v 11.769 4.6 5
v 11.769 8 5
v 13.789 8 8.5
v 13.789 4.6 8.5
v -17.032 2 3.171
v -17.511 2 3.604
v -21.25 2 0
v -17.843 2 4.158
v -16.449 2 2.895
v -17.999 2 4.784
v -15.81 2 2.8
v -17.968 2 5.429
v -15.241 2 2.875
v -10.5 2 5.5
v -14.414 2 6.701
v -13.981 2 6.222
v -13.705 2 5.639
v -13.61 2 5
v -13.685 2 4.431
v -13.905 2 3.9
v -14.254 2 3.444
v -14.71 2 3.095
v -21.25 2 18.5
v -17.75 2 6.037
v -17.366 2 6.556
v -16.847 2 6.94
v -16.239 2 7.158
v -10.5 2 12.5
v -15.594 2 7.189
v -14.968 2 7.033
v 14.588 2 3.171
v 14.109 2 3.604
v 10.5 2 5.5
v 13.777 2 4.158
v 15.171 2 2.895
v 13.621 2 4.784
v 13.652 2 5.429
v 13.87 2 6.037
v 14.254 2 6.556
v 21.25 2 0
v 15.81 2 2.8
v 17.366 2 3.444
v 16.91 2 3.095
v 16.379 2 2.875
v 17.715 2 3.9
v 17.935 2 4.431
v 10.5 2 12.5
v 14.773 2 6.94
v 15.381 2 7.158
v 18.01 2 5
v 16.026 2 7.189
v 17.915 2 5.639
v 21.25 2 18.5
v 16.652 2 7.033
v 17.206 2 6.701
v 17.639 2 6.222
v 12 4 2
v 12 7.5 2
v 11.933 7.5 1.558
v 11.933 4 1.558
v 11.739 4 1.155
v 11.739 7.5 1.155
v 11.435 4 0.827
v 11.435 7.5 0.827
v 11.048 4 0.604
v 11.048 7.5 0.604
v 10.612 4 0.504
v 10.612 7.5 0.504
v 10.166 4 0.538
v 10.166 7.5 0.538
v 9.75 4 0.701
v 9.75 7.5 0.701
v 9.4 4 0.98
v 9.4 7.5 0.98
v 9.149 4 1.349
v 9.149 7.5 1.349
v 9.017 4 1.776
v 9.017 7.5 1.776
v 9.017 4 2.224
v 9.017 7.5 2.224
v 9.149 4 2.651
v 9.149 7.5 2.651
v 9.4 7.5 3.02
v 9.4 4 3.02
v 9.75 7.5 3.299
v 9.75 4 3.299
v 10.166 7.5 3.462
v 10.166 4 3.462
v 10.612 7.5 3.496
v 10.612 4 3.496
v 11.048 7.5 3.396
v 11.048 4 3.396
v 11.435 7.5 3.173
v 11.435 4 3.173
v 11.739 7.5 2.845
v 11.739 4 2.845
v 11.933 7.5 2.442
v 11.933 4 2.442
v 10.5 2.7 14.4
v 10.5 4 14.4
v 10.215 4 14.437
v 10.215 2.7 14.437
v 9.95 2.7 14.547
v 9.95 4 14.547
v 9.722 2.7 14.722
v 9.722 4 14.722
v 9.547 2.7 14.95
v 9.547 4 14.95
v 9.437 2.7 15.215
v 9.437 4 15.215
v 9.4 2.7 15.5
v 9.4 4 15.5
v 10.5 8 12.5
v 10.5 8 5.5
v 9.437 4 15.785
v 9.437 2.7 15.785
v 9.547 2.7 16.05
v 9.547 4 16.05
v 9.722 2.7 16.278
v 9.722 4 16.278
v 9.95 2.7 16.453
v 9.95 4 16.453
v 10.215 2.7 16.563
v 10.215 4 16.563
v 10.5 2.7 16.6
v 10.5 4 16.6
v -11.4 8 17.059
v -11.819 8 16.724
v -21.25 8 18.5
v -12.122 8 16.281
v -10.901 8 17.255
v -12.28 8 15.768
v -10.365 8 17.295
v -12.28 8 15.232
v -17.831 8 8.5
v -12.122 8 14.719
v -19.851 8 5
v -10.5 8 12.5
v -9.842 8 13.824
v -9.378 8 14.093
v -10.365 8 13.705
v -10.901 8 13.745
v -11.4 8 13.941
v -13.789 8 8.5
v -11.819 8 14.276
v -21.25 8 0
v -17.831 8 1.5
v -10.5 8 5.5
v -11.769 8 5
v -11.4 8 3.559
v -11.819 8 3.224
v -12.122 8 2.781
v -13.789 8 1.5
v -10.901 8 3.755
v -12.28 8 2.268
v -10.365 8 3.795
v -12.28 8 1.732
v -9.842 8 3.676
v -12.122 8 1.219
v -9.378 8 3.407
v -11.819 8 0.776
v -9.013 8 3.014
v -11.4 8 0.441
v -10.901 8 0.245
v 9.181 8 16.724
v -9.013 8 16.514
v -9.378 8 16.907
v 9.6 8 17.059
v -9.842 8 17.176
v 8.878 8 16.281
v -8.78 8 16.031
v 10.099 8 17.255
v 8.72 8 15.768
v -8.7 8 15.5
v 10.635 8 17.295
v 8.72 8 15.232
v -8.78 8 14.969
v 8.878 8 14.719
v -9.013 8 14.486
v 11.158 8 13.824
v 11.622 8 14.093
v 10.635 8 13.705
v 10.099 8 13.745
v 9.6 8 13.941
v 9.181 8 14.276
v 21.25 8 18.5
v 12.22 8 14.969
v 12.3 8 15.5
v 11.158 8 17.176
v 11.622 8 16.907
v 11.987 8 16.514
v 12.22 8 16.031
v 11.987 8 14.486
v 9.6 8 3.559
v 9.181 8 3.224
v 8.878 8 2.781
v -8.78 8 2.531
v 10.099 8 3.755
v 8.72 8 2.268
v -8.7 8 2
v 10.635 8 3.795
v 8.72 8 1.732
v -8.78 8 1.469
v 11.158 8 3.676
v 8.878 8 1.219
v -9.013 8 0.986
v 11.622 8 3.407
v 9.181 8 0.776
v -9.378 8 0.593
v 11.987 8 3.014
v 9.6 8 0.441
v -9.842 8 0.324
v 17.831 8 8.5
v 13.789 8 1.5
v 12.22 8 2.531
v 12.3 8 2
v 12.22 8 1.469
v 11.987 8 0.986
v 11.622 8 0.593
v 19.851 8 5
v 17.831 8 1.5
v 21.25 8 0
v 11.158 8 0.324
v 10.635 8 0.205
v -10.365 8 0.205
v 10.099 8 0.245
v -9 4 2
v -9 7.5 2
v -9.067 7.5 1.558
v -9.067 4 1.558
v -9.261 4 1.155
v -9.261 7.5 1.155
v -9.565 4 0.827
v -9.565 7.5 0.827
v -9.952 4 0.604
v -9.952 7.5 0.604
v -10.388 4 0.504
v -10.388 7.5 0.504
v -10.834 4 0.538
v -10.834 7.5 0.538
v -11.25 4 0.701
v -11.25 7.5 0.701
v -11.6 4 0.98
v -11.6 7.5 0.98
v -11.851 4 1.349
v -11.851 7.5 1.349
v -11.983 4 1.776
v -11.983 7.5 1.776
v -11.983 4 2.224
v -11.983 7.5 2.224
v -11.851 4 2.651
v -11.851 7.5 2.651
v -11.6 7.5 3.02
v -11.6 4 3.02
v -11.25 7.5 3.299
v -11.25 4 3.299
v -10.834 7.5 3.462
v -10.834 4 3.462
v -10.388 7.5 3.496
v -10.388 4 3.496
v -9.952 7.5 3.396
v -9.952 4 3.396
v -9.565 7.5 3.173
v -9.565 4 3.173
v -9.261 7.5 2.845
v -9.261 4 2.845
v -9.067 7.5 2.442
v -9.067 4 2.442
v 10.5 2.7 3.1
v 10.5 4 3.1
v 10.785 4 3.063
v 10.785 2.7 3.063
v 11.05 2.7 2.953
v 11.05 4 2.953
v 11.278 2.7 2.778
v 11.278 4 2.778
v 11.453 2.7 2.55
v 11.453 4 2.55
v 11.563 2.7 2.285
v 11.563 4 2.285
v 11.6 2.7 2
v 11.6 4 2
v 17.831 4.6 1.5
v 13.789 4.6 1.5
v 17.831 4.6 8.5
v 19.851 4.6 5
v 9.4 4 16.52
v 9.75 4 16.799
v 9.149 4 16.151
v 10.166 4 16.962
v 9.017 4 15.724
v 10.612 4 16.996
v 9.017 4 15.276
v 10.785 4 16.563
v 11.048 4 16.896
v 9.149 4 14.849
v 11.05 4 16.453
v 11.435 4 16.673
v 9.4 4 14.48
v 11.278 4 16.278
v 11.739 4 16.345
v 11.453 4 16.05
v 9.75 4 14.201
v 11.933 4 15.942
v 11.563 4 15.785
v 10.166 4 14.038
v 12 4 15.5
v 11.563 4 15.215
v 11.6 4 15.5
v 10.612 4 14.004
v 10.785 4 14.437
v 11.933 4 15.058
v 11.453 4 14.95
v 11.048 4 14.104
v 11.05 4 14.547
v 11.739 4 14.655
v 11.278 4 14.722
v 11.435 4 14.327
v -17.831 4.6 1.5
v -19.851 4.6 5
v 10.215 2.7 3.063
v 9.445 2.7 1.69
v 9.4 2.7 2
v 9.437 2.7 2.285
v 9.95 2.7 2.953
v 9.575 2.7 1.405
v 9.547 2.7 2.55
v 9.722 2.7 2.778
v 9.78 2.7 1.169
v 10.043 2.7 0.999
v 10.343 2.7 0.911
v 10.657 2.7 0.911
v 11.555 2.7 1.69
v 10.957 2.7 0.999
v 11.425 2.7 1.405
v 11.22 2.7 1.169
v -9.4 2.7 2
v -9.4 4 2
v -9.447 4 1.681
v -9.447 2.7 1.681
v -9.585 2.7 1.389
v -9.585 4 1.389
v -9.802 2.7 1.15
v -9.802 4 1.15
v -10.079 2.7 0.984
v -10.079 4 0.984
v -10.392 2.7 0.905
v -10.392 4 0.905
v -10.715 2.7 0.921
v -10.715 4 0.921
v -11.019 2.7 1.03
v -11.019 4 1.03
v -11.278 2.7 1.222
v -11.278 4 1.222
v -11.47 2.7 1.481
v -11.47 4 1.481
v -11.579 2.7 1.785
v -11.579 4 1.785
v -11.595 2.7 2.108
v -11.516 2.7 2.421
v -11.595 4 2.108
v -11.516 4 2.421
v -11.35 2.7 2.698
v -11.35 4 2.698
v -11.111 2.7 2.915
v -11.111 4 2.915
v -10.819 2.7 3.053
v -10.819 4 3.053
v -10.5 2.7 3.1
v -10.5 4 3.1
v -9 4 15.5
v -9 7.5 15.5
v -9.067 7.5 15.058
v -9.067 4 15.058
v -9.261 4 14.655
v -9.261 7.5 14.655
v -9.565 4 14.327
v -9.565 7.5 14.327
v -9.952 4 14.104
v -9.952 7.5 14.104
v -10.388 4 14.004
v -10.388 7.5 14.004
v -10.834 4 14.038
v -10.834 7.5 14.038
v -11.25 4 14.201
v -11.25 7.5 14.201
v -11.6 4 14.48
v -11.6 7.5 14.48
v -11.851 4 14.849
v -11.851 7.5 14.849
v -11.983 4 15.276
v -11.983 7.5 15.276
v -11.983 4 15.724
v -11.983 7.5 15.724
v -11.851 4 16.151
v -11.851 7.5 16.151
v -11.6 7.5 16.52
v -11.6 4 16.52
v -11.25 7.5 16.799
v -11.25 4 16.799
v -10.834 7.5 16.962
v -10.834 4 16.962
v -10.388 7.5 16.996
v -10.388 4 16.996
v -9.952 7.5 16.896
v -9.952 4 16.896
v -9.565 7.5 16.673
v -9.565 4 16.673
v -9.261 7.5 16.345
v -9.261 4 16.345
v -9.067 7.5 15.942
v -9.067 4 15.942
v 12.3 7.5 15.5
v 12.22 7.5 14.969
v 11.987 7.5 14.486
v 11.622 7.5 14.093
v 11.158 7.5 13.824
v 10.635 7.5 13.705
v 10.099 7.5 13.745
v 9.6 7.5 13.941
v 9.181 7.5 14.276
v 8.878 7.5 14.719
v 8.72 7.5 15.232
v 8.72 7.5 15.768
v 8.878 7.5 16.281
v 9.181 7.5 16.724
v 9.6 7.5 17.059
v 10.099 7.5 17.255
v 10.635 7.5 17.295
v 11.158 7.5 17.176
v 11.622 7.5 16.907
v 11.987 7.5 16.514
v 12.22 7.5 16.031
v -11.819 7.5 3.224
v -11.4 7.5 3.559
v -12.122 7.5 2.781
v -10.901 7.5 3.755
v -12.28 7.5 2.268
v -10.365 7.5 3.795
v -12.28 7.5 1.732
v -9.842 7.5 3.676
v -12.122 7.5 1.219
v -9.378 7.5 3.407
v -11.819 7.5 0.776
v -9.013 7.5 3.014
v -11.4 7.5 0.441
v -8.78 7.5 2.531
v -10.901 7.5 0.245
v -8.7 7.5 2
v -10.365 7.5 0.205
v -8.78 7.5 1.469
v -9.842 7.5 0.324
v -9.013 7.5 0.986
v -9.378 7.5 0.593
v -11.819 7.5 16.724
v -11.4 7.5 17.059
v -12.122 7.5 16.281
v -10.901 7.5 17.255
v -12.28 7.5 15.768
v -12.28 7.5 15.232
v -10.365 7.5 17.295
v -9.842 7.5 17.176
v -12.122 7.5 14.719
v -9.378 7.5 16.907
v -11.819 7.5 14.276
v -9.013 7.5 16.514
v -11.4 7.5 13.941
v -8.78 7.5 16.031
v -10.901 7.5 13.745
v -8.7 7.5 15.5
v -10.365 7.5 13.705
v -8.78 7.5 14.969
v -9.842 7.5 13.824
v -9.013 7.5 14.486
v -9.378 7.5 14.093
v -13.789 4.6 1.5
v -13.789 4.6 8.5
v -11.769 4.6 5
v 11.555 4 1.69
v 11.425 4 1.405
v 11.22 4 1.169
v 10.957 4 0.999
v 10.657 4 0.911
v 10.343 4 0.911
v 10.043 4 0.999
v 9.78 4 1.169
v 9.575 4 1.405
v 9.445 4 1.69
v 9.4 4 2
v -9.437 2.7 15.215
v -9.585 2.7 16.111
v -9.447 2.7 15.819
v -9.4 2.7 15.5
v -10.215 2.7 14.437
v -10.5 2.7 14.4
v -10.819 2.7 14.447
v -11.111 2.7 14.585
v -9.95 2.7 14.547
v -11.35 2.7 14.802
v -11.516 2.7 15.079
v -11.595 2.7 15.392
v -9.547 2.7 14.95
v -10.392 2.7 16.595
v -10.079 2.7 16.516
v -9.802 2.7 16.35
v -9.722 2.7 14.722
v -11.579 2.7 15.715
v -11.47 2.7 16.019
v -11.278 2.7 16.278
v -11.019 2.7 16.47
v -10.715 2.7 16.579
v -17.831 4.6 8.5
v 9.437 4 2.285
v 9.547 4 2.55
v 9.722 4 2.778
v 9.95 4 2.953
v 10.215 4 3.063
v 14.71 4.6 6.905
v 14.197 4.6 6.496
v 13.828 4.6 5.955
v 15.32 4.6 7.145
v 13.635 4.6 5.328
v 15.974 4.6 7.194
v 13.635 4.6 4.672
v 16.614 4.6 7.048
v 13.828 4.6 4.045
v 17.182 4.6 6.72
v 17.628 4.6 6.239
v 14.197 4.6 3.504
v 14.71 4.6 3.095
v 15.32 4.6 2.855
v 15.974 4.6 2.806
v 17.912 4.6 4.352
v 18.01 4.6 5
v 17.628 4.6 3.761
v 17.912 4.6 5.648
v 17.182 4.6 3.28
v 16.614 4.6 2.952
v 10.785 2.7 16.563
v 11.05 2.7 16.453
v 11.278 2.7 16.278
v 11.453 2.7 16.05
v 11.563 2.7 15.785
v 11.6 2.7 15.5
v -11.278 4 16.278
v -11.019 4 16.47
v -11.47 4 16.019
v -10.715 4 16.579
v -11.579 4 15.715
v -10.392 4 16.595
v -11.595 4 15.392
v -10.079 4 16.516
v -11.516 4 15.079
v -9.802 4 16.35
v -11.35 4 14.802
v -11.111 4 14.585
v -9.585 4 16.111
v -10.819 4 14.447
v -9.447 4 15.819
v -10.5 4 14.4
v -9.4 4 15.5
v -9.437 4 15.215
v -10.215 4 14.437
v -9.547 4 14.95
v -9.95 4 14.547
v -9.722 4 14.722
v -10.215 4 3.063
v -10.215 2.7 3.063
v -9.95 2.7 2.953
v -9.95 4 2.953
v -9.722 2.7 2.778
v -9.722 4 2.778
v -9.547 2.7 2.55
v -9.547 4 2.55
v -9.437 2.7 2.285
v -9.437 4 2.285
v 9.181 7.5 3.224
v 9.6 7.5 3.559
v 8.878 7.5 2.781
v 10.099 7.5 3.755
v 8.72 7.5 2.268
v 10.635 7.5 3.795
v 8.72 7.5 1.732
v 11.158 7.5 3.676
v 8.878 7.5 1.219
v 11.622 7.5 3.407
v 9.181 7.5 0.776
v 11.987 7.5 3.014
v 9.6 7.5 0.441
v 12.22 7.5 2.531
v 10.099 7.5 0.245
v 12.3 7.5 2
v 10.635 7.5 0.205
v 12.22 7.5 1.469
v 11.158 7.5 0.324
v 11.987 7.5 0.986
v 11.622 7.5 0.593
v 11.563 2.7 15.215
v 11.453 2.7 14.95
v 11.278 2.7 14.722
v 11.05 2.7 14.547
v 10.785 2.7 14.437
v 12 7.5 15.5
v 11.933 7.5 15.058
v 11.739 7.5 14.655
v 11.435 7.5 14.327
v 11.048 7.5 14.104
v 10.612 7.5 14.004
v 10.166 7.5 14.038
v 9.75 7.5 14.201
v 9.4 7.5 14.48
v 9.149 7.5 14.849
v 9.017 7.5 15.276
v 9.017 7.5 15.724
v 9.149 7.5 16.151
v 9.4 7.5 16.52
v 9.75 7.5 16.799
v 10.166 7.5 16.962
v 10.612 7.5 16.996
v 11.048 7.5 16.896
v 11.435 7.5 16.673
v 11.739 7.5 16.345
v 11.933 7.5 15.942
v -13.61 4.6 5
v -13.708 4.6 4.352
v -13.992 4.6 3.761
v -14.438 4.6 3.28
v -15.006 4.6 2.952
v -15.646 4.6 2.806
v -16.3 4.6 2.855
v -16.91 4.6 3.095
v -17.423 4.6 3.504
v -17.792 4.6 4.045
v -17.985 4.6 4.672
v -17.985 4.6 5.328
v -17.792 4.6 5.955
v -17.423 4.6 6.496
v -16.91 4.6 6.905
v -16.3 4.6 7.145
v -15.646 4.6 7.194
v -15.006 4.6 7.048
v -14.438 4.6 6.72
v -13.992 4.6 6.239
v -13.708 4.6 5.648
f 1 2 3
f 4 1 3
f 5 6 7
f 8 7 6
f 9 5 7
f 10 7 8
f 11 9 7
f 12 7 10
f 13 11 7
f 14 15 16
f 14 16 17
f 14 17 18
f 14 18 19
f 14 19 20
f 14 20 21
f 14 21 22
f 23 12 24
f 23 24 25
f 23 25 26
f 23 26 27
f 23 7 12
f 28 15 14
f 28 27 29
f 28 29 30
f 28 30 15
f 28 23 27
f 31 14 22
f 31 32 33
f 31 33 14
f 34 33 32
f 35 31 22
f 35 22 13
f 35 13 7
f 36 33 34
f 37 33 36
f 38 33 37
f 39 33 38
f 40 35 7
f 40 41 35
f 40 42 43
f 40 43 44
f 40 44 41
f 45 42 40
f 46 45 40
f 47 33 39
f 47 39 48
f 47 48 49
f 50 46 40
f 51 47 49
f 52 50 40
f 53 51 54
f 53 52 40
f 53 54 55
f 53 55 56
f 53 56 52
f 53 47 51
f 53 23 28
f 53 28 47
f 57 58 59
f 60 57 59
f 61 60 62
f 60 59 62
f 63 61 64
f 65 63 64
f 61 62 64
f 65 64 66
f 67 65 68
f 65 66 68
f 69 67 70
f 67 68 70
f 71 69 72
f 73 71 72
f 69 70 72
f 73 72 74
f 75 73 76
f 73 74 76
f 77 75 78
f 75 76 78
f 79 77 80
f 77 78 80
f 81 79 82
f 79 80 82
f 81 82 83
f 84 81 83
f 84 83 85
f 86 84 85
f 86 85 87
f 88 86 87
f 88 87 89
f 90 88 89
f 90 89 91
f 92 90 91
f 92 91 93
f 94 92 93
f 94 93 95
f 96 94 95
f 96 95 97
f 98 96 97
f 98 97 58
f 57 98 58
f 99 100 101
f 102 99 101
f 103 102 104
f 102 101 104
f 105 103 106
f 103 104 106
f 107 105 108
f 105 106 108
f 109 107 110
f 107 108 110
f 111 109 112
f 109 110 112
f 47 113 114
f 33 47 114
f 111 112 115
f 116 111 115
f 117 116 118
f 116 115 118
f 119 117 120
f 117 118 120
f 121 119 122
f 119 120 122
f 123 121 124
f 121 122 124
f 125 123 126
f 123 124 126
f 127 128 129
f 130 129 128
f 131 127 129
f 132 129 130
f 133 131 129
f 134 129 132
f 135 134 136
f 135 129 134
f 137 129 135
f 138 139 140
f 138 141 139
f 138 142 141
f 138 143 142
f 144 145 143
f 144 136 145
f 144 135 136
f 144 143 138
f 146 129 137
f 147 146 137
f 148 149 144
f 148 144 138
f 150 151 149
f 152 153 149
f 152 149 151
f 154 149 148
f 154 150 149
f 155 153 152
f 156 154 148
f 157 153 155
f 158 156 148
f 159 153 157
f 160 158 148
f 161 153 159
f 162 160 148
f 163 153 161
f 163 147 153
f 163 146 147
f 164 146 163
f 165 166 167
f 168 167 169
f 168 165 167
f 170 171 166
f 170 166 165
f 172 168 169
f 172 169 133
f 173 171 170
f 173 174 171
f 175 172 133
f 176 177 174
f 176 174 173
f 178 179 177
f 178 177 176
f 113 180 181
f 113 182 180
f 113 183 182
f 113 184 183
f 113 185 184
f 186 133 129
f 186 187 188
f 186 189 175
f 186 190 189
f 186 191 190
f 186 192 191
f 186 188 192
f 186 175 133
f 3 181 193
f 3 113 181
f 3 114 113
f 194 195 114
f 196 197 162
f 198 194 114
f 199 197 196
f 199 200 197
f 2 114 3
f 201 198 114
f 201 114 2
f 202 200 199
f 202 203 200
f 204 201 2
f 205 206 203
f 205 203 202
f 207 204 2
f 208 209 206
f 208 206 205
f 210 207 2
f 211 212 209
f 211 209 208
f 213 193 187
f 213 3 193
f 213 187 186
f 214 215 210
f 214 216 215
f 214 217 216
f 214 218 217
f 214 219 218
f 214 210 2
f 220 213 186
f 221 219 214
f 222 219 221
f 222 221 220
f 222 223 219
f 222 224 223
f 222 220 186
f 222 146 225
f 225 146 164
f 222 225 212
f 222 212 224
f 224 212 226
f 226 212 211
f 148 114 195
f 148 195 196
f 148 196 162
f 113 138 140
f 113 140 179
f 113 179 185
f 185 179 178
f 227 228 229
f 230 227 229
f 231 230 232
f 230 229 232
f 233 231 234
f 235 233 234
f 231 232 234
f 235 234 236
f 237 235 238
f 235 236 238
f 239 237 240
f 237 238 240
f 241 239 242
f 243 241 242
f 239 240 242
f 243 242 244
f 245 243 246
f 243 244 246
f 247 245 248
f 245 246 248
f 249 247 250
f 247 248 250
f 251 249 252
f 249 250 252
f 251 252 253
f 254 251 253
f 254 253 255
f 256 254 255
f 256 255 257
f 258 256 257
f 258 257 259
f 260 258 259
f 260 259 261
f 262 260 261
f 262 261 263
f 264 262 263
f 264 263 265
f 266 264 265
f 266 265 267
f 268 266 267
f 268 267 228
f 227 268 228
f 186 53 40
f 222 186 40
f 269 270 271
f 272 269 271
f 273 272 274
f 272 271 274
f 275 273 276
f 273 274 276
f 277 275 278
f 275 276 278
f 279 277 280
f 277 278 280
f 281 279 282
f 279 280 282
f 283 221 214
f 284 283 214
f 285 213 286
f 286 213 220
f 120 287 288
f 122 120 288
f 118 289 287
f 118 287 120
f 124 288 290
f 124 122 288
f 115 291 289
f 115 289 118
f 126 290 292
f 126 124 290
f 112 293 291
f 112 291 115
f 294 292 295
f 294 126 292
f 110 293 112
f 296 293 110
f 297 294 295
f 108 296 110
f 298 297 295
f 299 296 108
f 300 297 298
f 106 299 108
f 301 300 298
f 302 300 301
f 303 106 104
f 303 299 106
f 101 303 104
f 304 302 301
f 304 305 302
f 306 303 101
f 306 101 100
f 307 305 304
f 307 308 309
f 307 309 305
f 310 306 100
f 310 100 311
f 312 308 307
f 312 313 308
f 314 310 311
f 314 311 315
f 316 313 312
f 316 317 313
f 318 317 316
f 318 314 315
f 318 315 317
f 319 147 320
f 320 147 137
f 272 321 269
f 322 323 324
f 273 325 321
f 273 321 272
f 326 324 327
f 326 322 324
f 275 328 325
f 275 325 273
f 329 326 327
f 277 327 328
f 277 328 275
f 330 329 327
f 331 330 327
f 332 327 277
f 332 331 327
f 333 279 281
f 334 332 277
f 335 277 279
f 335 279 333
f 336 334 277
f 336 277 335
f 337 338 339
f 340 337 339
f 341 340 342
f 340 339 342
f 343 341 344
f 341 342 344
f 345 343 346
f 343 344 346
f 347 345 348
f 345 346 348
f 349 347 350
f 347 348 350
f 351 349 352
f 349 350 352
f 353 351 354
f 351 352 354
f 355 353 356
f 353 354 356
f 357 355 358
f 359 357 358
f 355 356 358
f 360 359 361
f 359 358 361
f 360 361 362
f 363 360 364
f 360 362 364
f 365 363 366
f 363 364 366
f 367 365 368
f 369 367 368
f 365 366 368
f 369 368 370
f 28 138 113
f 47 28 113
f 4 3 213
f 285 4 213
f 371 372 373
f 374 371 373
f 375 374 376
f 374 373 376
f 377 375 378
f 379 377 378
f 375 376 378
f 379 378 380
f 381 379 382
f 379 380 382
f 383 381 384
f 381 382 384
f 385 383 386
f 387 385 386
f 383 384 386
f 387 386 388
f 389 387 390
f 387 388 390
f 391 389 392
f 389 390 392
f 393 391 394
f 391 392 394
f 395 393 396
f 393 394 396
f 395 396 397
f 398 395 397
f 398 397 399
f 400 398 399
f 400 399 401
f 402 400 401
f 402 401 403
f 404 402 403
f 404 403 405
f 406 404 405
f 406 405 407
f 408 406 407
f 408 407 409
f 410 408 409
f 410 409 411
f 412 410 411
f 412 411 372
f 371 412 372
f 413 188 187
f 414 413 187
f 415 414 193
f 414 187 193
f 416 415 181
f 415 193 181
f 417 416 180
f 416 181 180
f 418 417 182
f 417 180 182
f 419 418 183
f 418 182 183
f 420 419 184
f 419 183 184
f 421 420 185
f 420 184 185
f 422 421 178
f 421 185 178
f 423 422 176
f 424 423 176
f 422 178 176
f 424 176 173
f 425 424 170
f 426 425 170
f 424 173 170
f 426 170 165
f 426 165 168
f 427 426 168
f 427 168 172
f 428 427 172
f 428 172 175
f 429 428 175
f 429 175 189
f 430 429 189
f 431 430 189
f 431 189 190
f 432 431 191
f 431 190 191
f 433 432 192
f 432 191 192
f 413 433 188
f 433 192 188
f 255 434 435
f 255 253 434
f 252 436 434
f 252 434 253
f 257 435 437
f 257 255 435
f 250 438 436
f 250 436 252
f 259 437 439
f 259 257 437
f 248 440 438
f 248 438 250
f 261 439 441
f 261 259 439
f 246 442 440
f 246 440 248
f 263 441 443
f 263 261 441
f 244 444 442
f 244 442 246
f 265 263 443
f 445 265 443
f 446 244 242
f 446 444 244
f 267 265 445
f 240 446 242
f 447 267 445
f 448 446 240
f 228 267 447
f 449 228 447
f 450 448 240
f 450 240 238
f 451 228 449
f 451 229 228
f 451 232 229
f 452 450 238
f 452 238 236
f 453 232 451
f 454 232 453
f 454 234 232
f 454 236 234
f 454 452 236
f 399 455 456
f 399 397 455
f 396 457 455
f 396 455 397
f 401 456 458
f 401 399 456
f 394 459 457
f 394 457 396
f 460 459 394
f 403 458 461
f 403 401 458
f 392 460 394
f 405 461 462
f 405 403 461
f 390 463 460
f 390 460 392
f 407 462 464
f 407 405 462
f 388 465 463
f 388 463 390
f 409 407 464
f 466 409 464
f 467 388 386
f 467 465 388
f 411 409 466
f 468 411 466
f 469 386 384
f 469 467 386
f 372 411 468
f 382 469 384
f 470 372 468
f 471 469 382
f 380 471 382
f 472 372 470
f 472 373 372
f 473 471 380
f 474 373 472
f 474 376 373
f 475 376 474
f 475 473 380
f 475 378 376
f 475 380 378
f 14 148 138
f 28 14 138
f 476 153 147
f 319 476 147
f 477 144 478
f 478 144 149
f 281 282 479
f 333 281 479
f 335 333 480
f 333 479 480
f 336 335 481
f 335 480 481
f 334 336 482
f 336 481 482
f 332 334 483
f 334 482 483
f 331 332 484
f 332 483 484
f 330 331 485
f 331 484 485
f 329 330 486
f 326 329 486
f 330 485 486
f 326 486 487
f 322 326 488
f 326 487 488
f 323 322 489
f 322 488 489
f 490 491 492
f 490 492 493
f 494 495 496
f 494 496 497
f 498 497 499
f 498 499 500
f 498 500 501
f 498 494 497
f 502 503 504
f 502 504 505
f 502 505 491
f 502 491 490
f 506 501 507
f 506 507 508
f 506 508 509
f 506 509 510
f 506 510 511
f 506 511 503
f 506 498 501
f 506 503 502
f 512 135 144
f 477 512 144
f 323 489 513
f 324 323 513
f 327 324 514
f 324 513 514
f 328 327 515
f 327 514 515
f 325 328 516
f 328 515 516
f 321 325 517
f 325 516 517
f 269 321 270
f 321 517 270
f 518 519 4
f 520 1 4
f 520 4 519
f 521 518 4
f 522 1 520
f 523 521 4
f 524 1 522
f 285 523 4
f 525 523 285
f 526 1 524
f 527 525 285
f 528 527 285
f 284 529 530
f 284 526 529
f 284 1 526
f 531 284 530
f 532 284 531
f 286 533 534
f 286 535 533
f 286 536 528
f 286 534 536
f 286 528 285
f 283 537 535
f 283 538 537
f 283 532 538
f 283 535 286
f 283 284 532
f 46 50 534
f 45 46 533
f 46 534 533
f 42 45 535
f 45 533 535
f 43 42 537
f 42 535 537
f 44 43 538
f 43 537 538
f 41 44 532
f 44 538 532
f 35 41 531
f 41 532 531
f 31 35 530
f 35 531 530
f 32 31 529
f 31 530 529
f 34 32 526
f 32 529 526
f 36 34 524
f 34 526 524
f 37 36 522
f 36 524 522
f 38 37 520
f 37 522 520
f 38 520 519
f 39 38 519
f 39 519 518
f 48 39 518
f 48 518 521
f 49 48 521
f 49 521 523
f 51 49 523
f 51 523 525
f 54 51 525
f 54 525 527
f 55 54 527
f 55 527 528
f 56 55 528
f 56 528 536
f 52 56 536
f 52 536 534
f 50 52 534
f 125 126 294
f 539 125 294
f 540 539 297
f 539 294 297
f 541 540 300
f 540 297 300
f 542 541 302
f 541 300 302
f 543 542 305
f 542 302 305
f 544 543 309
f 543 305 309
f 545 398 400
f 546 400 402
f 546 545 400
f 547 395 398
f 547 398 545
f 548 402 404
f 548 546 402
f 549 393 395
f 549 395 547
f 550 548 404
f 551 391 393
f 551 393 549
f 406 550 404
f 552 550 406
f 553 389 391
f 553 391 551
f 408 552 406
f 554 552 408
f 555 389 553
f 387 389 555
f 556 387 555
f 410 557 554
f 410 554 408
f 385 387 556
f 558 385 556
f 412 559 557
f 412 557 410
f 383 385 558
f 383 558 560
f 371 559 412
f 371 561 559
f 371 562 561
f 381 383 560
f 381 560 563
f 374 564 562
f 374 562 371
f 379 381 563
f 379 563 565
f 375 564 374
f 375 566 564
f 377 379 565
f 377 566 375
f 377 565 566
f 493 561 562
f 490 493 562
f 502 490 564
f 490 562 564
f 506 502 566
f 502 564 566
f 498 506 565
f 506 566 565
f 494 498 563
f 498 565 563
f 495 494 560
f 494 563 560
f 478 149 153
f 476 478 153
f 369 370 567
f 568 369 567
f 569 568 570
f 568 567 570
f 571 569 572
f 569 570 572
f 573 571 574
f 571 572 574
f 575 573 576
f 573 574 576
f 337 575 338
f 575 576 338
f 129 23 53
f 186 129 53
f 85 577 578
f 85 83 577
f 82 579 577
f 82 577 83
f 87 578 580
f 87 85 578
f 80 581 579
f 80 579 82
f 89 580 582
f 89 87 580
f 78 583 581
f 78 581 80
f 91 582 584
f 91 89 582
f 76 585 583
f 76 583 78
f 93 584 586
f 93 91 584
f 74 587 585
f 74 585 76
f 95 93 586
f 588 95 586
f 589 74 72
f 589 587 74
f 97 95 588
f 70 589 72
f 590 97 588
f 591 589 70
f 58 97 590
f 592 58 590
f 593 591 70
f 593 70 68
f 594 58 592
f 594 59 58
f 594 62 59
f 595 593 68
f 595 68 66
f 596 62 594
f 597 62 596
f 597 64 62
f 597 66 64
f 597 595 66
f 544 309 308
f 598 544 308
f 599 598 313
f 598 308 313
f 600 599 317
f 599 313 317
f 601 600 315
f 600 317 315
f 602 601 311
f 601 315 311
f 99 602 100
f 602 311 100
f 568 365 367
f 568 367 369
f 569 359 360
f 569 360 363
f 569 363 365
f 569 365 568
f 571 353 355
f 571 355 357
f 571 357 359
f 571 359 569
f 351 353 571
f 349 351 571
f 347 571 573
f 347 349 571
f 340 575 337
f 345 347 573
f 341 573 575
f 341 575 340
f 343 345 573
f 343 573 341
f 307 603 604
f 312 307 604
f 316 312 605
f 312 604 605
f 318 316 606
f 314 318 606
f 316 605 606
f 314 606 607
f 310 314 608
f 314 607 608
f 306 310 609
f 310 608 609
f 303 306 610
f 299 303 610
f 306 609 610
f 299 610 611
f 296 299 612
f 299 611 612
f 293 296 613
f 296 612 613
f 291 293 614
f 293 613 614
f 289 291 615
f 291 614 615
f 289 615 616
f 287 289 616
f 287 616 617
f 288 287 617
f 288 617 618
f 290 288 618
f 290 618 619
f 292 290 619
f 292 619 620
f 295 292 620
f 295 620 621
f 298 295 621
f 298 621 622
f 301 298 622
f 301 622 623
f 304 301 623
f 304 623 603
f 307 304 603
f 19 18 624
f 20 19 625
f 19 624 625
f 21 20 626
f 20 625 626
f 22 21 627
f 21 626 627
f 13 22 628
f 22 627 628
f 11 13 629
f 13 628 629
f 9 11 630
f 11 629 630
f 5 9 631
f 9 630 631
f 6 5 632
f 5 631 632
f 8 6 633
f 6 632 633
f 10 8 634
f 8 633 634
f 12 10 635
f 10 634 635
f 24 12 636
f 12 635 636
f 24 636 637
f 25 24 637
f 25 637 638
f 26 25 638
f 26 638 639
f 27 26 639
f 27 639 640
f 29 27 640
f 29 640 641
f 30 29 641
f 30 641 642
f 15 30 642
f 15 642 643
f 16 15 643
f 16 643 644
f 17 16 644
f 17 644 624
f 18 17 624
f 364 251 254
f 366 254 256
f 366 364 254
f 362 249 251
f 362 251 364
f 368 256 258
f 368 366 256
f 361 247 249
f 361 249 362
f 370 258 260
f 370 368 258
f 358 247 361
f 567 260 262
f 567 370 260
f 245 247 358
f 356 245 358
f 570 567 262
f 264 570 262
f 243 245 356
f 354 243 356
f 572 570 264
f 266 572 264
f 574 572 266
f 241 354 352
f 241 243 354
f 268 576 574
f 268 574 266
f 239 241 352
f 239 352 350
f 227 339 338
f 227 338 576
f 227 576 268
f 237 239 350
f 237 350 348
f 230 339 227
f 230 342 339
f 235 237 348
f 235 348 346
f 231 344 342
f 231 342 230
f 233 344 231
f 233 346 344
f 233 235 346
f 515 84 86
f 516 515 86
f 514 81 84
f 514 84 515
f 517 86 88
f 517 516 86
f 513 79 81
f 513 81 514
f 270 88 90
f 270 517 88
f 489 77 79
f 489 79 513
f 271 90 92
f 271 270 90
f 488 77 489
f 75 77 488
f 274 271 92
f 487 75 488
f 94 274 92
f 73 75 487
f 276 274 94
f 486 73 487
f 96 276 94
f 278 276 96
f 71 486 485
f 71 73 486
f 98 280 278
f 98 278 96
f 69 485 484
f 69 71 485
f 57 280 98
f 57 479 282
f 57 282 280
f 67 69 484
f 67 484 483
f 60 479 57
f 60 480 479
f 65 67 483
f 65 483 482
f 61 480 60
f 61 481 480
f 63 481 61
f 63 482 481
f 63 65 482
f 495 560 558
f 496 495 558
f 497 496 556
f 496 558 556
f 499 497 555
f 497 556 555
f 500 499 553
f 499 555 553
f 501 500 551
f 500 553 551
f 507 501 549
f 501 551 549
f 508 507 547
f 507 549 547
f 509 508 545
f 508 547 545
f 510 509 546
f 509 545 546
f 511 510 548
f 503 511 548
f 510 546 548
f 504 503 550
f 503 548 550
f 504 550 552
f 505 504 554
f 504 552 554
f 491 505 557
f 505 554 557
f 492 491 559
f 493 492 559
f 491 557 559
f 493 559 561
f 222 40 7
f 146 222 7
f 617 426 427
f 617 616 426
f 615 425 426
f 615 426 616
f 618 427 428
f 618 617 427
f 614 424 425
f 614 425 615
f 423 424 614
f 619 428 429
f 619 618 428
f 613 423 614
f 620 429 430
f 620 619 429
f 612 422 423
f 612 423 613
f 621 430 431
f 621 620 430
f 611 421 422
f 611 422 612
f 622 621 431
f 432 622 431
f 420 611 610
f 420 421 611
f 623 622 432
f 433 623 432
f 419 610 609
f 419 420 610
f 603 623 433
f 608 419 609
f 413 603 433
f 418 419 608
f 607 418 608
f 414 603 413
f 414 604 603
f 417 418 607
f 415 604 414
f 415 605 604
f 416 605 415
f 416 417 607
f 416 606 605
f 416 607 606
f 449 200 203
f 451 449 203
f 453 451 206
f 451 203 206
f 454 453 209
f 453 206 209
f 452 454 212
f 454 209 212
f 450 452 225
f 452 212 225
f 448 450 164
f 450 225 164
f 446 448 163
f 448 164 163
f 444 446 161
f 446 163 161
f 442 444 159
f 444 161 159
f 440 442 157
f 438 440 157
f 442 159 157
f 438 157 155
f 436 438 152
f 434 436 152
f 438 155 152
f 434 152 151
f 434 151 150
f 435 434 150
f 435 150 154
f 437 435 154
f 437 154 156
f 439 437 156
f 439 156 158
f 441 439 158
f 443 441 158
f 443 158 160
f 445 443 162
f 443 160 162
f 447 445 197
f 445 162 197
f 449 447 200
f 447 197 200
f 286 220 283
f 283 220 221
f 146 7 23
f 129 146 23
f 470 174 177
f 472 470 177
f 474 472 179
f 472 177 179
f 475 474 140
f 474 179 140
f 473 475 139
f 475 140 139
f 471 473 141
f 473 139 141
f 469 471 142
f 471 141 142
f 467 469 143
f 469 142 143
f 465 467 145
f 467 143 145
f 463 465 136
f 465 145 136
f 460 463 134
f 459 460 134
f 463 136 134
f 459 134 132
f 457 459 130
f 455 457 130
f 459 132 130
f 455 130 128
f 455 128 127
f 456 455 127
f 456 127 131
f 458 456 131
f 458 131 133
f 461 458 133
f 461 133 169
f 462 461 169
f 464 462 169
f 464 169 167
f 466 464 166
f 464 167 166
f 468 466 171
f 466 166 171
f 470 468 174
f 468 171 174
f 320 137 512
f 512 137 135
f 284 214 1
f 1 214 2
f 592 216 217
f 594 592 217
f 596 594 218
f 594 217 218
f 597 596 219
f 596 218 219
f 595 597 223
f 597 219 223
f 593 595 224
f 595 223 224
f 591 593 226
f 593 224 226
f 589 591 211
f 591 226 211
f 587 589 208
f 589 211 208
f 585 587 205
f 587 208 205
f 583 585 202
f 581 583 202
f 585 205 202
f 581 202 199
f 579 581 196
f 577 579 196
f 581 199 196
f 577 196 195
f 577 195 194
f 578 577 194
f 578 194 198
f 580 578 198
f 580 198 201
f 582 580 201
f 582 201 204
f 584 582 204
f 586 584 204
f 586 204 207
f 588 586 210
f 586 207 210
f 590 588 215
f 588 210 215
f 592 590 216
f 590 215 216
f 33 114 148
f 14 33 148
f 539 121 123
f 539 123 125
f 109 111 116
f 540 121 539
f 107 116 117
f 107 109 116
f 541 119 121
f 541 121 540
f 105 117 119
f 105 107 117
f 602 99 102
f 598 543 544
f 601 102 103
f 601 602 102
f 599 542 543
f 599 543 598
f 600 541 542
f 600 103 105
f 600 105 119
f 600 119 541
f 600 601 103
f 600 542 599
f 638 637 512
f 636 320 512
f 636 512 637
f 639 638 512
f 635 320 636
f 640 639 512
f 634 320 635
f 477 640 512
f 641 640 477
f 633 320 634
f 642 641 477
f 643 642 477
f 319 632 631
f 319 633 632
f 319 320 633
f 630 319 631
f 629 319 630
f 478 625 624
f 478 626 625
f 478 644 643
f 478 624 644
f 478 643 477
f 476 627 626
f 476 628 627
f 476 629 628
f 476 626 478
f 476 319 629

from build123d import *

# Parameters (mm, degrees)
BOSS_EXTRUDE1_DEPTH = 8
SKETCH2_R           = 2.2
CUT_EXTRUDE1_DEPTH  = 20
CUT_EXTRUDE2_DEPTH  = 5.3
SKETCH4_R           = 1.5
CUT_EXTRUDE3_DEPTH  = 4
SKETCH5_R           = 1.8
CUT_EXTRUDE4_DEPTH  = 0.5
CUT_EXTRUDE5_DEPTH  = 3.4
CUT_EXTRUDE6_DEPTH  = 18.4
SKETCH9_W           = 21
SKETCH9_H           = 3
CUT_EXTRUDE8_DEPTH  = 2


with BuildPart() as part:
    # Sketch1 → Boss-Extrude1 (new body)
    with BuildSketch(Plane(origin=(0, 0, 0), x_dir=(1, 0, 0), z_dir=(0, 1, 0))):
        Polygon((-21.25, -18.5), (21.25, -18.5), (21.25, 0), (15.81, 0), (-15.81, 0), (-21.25, 0), align=None)
    extrude(amount=BOSS_EXTRUDE1_DEPTH)

    # Sketch2 → Cut-Extrude1 (cut)
    with BuildSketch(Plane(origin=(0, 8, 0), x_dir=(1, 0, 0), z_dir=(0, 1, 0))):
        with Locations((-15.81, -5)):
            Circle(SKETCH2_R)
        with Locations((15.81, -5)):
            Circle(SKETCH2_R)
    extrude(amount=-CUT_EXTRUDE1_DEPTH, mode=Mode.SUBTRACT)

    # Sketch3 → Cut-Extrude2 (cut)
    with BuildSketch(Plane(origin=(0, 8, 0), x_dir=(1, 0, 0), z_dir=(0, 1, 0))):
        with BuildLine():
            ThreePointArc((-10.5, -14.4), (-11.277817459, -16.277817459), (-9.4, -15.5))
            Line((-9.4, -15.5), (-10.5, -15.5))
            Line((-10.5, -15.5), (-10.5, -14.4))
        make_face()
        with BuildLine():
            Line((-10.5, -15.5), (-9.4, -15.5))
            ThreePointArc((-9.4, -15.5), (-9.722182541, -14.722182541), (-10.5, -14.4))
            Line((-10.5, -14.4), (-10.5, -15.5))
        make_face()
        with BuildLine():
            ThreePointArc((-9.4, -2), (-11.277817459, -1.222182541), (-10.5, -3.1))
            Line((-10.5, -3.1), (-10.5, -2))
            Line((-10.5, -2), (-9.4, -2))
        make_face()
        with BuildLine():
            Line((-10.5, -2), (-10.5, -3.1))
            ThreePointArc((-10.5, -3.1), (-9.722182541, -2.777817459), (-9.4, -2))
            Line((-9.4, -2), (-10.5, -2))
        make_face()
        with BuildLine():
            ThreePointArc((9.4, -2), (9.722182541, -2.777817459), (10.5, -3.1))
            Line((10.5, -3.1), (10.5, -2))
            Line((10.5, -2), (9.4, -2))
        make_face()
        with BuildLine():
            Line((10.5, -2), (10.5, -3.1))
            ThreePointArc((10.5, -3.1), (11.277817459, -2.777817459), (11.6, -2))
            ThreePointArc((11.6, -2), (10.5, -0.9), (9.4, -2))
            Line((9.4, -2), (10.5, -2))
        make_face()
        with BuildLine():
            Line((10.5, -16.6), (10.5, -15.5))
            Line((10.5, -15.5), (9.4, -15.5))
            ThreePointArc((9.4, -15.5), (9.722182541, -16.277817459), (10.5, -16.6))
        make_face()
        with BuildLine():
            Line((10.5, -14.4), (10.5, -15.5))
            Line((10.5, -15.5), (10.5, -16.6))
            ThreePointArc((10.5, -16.6), (11.277817459, -16.277817459), (11.6, -15.5))
            ThreePointArc((11.6, -15.5), (11.277817459, -14.722182541), (10.5, -14.4))
        make_face()
        with BuildLine():
            Line((9.4, -15.5), (10.5, -15.5))
            Line((10.5, -15.5), (10.5, -14.4))
            ThreePointArc((10.5, -14.4), (9.722182541, -14.722182541), (9.4, -15.5))
        make_face()
    extrude(amount=-CUT_EXTRUDE2_DEPTH, mode=Mode.SUBTRACT)

    # Sketch4 → Cut-Extrude3 (cut)
    with BuildSketch(Plane(origin=(0, 8, 0), x_dir=(1, 0, 0), z_dir=(0, 1, 0))):
        with Locations((-10.5, -2)):
            Circle(SKETCH4_R)
        with Locations((10.5, -2)):
            Circle(SKETCH4_R)
        with Locations((-10.5, -15.5)):
            Circle(SKETCH4_R)
        with Locations((10.5, -15.5)):
            Circle(SKETCH4_R)
    extrude(amount=-CUT_EXTRUDE3_DEPTH, mode=Mode.SUBTRACT)

    # Sketch5 → Cut-Extrude4 (cut)
    with BuildSketch(Plane(origin=(0, 8, 0), x_dir=(1, 0, 0), z_dir=(0, 1, 0))):
        with Locations((-10.5, -2)):
            Circle(SKETCH5_R)
        with Locations((10.5, -2)):
            Circle(SKETCH5_R)
        with Locations((-10.5, -15.5)):
            Circle(SKETCH5_R)
        with Locations((10.5, -15.5)):
            Circle(SKETCH5_R)
    extrude(amount=-CUT_EXTRUDE4_DEPTH, mode=Mode.SUBTRACT)

    # Sketch6 → Cut-Extrude5 (cut)
    with BuildSketch(Plane(origin=(0, 8, 0), x_dir=(1, 0, 0), z_dir=(0, 1, 0))):
        Polygon((-11.768548116, -5), (-13.789274058, -1.5), (-17.830725942, -1.5), (-19.851451884, -5), (-17.830725942, -8.5), (-13.789274058, -8.5), align=None)
        Polygon((19.851451884, -5), (17.830725942, -1.5), (13.789274058, -1.5), (11.768548116, -5), (13.789274058, -8.5), (17.830725942, -8.5), align=None)
    extrude(amount=-CUT_EXTRUDE5_DEPTH, mode=Mode.SUBTRACT)

    # Sketch7 → Cut-Extrude6 (cut)
    with BuildSketch(Plane(origin=(0, 8, 0), x_dir=(1, 0, 0), z_dir=(0, 1, 0))):
        Polygon((10.5, -9), (10.5, -5.5), (-10.5, -5.5), (-10.5, -12.5), (10.5, -12.5), align=None)
    extrude(amount=-CUT_EXTRUDE6_DEPTH, mode=Mode.SUBTRACT)

    # Sketch9 → Cut-Extrude8 (cut)
    with BuildSketch(Plane.XZ):
        Polygon((-10.5, 15.5), (10.5, 15.5), (10.5, 18.5), (-21.25, 18.5), (-21.25, 0), (-15.81, 0), (0, 0), (0, 2), (-10.5, 2), (-10.5, 5.5), (-10.5, 12.5), align=None)
        with BuildLine():
            ThreePointArc((-13.61, 5), (-14.254365081, 3.444365081), (-15.81, 2.8))
            ThreePointArc((-15.81, 2.8), (-17.365634919, 6.555634919), (-13.61, 5))
        make_face(mode=Mode.SUBTRACT)
        with Locations((0, 14)):
            Rectangle(SKETCH9_W, SKETCH9_H)
        Polygon((10.5, 2), (10.5, 5.5), (-10.5, 5.5), (-10.5, 2), (0, 2), align=None)
        Polygon((10.5, 18.5), (10.5, 15.5), (10.5, 12.5), (10.5, 5.5), (10.5, 2), (0, 2), (0, 0), (15.81, 0), (21.25, 0), (21.25, 18.5), align=None)
        with BuildLine():
            ThreePointArc((18.01, 5), (17.365634919, 3.444365081), (15.81, 2.8))
            ThreePointArc((15.81, 2.8), (14.254365081, 6.555634919), (18.01, 5))
        make_face(mode=Mode.SUBTRACT)
    extrude(amount=-CUT_EXTRUDE8_DEPTH, mode=Mode.SUBTRACT)


solid = part.part
